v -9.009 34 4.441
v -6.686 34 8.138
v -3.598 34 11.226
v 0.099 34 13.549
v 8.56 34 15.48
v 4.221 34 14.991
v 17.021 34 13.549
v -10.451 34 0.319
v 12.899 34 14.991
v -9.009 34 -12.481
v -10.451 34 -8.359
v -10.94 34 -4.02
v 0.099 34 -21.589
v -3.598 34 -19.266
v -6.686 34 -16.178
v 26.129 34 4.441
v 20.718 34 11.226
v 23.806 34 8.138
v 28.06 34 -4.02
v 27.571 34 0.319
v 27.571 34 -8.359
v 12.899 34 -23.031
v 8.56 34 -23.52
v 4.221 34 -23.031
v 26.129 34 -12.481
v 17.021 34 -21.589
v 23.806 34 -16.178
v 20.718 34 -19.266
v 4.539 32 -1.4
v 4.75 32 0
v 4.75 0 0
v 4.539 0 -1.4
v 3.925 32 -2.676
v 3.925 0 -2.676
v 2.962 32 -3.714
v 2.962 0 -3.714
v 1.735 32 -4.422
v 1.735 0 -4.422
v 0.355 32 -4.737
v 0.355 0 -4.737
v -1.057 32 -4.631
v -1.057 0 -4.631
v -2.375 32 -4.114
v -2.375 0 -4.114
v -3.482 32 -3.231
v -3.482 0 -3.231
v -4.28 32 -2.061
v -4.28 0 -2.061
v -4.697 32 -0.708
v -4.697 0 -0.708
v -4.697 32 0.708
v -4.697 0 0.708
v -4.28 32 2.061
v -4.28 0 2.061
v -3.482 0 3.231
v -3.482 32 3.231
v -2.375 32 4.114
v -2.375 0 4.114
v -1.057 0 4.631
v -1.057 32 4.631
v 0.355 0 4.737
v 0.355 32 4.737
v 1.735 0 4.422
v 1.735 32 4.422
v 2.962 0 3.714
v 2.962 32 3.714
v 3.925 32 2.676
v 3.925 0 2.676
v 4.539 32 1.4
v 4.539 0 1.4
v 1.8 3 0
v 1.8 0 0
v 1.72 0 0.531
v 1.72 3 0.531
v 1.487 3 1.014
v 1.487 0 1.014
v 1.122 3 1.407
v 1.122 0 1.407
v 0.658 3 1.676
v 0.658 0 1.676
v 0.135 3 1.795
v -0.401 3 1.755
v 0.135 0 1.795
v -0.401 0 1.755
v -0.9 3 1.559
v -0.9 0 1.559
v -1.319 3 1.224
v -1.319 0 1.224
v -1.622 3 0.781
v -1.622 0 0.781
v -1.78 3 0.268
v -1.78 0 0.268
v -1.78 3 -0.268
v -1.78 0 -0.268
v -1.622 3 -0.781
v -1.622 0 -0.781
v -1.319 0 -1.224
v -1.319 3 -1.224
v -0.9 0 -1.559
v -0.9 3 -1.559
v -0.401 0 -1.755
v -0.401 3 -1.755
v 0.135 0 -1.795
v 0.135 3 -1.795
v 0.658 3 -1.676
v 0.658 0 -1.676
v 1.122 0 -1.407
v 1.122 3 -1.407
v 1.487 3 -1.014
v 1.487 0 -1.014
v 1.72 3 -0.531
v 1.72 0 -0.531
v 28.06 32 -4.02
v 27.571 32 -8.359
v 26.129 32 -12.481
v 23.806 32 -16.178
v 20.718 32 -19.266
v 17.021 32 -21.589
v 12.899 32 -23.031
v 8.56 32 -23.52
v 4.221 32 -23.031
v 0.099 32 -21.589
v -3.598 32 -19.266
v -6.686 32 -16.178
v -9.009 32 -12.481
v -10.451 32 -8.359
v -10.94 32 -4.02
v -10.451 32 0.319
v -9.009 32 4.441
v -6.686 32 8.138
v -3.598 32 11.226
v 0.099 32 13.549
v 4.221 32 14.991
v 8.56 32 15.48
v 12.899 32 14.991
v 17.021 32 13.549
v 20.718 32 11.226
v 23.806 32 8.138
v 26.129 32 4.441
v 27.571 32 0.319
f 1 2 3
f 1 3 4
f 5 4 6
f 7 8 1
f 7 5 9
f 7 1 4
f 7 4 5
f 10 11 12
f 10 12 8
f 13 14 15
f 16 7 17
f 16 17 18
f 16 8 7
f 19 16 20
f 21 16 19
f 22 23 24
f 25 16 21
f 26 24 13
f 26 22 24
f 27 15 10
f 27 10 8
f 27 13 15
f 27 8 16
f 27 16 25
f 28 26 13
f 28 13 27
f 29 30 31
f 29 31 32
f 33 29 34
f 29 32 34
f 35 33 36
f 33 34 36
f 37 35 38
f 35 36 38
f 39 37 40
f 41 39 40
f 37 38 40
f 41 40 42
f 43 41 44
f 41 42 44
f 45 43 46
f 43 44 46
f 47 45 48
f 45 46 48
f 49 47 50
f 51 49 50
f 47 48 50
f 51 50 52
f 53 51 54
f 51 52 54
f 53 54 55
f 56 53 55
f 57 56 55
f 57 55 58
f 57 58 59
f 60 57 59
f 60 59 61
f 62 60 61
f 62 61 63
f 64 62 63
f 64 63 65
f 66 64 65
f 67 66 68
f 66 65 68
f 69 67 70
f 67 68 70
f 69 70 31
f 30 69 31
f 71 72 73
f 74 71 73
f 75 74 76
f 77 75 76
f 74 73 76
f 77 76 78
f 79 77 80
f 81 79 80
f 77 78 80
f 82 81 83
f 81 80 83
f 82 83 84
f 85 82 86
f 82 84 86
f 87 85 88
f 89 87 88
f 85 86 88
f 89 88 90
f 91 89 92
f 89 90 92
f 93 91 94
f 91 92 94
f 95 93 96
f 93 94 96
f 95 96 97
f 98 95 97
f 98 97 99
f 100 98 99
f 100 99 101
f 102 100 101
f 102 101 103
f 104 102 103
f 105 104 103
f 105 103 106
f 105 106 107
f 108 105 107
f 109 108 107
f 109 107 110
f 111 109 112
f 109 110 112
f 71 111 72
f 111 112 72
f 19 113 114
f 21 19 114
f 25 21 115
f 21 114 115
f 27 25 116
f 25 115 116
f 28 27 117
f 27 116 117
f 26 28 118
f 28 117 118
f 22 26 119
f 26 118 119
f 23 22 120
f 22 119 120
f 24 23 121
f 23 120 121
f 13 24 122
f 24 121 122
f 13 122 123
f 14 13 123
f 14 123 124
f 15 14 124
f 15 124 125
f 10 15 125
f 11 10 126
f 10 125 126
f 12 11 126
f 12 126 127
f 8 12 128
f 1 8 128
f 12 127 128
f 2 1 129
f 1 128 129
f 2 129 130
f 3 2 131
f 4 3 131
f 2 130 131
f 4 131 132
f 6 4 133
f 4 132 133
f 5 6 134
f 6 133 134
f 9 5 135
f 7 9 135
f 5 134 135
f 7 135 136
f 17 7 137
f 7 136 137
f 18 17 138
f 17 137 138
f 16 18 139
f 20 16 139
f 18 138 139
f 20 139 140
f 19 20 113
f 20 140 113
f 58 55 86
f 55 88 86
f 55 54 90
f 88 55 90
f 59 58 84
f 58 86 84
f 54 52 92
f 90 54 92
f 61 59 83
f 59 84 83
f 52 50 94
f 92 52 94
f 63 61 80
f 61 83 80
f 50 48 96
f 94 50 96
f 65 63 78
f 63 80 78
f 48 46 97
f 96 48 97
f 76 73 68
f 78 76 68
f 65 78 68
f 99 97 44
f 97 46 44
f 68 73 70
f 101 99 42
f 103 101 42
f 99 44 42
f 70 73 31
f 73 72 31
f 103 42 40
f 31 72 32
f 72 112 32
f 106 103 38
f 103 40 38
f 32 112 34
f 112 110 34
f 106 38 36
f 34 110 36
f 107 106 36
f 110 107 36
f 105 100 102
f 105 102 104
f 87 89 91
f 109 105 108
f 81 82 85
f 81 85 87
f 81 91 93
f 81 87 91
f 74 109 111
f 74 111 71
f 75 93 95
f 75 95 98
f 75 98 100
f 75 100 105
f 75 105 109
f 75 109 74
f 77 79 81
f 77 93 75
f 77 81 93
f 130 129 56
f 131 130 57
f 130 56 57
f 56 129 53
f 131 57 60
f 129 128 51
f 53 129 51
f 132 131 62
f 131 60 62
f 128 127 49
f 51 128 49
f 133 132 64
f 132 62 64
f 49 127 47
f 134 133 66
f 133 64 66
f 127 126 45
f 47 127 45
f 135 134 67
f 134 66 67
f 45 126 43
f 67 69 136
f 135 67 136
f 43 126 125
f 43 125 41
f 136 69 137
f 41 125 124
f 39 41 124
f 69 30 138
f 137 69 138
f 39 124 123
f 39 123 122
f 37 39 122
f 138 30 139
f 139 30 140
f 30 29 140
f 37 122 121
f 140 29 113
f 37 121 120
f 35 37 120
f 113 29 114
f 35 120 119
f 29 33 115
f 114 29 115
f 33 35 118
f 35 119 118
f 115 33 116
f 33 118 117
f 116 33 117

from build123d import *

# Parameters (mm, degrees)
SKETCH1_R           = 4.75
BOSS_EXTRUDE1_DEPTH = 32
SKETCH2_R           = 1.8
CUT_EXTRUDE1_DEPTH  = 3
SKETCH3_R           = 19.5
BOSS_EXTRUDE2_DEPTH = 2


with BuildPart() as part:
    # Sketch1 → Boss-Extrude1 (new body)
    with BuildSketch(Plane(origin=(0, 0, 0), x_dir=(1, 0, 0), z_dir=(0, 1, 0))):
        Circle(SKETCH1_R)
    extrude(amount=BOSS_EXTRUDE1_DEPTH)

    # Sketch2 → Cut-Extrude1 (cut)
    with BuildSketch(Plane.XZ):
        Circle(SKETCH2_R)
    extrude(amount=-CUT_EXTRUDE1_DEPTH, mode=Mode.SUBTRACT)

    # Sketch3 → Boss-Extrude2 (add)
    with BuildSketch(Plane(origin=(0, 32, 0), x_dir=(1, 0, 0), z_dir=(0, 1, 0))):
        with Locations((8.56, 4.02)):
            Circle(SKETCH3_R)
    extrude(amount=BOSS_EXTRUDE2_DEPTH)


solid = part.part
